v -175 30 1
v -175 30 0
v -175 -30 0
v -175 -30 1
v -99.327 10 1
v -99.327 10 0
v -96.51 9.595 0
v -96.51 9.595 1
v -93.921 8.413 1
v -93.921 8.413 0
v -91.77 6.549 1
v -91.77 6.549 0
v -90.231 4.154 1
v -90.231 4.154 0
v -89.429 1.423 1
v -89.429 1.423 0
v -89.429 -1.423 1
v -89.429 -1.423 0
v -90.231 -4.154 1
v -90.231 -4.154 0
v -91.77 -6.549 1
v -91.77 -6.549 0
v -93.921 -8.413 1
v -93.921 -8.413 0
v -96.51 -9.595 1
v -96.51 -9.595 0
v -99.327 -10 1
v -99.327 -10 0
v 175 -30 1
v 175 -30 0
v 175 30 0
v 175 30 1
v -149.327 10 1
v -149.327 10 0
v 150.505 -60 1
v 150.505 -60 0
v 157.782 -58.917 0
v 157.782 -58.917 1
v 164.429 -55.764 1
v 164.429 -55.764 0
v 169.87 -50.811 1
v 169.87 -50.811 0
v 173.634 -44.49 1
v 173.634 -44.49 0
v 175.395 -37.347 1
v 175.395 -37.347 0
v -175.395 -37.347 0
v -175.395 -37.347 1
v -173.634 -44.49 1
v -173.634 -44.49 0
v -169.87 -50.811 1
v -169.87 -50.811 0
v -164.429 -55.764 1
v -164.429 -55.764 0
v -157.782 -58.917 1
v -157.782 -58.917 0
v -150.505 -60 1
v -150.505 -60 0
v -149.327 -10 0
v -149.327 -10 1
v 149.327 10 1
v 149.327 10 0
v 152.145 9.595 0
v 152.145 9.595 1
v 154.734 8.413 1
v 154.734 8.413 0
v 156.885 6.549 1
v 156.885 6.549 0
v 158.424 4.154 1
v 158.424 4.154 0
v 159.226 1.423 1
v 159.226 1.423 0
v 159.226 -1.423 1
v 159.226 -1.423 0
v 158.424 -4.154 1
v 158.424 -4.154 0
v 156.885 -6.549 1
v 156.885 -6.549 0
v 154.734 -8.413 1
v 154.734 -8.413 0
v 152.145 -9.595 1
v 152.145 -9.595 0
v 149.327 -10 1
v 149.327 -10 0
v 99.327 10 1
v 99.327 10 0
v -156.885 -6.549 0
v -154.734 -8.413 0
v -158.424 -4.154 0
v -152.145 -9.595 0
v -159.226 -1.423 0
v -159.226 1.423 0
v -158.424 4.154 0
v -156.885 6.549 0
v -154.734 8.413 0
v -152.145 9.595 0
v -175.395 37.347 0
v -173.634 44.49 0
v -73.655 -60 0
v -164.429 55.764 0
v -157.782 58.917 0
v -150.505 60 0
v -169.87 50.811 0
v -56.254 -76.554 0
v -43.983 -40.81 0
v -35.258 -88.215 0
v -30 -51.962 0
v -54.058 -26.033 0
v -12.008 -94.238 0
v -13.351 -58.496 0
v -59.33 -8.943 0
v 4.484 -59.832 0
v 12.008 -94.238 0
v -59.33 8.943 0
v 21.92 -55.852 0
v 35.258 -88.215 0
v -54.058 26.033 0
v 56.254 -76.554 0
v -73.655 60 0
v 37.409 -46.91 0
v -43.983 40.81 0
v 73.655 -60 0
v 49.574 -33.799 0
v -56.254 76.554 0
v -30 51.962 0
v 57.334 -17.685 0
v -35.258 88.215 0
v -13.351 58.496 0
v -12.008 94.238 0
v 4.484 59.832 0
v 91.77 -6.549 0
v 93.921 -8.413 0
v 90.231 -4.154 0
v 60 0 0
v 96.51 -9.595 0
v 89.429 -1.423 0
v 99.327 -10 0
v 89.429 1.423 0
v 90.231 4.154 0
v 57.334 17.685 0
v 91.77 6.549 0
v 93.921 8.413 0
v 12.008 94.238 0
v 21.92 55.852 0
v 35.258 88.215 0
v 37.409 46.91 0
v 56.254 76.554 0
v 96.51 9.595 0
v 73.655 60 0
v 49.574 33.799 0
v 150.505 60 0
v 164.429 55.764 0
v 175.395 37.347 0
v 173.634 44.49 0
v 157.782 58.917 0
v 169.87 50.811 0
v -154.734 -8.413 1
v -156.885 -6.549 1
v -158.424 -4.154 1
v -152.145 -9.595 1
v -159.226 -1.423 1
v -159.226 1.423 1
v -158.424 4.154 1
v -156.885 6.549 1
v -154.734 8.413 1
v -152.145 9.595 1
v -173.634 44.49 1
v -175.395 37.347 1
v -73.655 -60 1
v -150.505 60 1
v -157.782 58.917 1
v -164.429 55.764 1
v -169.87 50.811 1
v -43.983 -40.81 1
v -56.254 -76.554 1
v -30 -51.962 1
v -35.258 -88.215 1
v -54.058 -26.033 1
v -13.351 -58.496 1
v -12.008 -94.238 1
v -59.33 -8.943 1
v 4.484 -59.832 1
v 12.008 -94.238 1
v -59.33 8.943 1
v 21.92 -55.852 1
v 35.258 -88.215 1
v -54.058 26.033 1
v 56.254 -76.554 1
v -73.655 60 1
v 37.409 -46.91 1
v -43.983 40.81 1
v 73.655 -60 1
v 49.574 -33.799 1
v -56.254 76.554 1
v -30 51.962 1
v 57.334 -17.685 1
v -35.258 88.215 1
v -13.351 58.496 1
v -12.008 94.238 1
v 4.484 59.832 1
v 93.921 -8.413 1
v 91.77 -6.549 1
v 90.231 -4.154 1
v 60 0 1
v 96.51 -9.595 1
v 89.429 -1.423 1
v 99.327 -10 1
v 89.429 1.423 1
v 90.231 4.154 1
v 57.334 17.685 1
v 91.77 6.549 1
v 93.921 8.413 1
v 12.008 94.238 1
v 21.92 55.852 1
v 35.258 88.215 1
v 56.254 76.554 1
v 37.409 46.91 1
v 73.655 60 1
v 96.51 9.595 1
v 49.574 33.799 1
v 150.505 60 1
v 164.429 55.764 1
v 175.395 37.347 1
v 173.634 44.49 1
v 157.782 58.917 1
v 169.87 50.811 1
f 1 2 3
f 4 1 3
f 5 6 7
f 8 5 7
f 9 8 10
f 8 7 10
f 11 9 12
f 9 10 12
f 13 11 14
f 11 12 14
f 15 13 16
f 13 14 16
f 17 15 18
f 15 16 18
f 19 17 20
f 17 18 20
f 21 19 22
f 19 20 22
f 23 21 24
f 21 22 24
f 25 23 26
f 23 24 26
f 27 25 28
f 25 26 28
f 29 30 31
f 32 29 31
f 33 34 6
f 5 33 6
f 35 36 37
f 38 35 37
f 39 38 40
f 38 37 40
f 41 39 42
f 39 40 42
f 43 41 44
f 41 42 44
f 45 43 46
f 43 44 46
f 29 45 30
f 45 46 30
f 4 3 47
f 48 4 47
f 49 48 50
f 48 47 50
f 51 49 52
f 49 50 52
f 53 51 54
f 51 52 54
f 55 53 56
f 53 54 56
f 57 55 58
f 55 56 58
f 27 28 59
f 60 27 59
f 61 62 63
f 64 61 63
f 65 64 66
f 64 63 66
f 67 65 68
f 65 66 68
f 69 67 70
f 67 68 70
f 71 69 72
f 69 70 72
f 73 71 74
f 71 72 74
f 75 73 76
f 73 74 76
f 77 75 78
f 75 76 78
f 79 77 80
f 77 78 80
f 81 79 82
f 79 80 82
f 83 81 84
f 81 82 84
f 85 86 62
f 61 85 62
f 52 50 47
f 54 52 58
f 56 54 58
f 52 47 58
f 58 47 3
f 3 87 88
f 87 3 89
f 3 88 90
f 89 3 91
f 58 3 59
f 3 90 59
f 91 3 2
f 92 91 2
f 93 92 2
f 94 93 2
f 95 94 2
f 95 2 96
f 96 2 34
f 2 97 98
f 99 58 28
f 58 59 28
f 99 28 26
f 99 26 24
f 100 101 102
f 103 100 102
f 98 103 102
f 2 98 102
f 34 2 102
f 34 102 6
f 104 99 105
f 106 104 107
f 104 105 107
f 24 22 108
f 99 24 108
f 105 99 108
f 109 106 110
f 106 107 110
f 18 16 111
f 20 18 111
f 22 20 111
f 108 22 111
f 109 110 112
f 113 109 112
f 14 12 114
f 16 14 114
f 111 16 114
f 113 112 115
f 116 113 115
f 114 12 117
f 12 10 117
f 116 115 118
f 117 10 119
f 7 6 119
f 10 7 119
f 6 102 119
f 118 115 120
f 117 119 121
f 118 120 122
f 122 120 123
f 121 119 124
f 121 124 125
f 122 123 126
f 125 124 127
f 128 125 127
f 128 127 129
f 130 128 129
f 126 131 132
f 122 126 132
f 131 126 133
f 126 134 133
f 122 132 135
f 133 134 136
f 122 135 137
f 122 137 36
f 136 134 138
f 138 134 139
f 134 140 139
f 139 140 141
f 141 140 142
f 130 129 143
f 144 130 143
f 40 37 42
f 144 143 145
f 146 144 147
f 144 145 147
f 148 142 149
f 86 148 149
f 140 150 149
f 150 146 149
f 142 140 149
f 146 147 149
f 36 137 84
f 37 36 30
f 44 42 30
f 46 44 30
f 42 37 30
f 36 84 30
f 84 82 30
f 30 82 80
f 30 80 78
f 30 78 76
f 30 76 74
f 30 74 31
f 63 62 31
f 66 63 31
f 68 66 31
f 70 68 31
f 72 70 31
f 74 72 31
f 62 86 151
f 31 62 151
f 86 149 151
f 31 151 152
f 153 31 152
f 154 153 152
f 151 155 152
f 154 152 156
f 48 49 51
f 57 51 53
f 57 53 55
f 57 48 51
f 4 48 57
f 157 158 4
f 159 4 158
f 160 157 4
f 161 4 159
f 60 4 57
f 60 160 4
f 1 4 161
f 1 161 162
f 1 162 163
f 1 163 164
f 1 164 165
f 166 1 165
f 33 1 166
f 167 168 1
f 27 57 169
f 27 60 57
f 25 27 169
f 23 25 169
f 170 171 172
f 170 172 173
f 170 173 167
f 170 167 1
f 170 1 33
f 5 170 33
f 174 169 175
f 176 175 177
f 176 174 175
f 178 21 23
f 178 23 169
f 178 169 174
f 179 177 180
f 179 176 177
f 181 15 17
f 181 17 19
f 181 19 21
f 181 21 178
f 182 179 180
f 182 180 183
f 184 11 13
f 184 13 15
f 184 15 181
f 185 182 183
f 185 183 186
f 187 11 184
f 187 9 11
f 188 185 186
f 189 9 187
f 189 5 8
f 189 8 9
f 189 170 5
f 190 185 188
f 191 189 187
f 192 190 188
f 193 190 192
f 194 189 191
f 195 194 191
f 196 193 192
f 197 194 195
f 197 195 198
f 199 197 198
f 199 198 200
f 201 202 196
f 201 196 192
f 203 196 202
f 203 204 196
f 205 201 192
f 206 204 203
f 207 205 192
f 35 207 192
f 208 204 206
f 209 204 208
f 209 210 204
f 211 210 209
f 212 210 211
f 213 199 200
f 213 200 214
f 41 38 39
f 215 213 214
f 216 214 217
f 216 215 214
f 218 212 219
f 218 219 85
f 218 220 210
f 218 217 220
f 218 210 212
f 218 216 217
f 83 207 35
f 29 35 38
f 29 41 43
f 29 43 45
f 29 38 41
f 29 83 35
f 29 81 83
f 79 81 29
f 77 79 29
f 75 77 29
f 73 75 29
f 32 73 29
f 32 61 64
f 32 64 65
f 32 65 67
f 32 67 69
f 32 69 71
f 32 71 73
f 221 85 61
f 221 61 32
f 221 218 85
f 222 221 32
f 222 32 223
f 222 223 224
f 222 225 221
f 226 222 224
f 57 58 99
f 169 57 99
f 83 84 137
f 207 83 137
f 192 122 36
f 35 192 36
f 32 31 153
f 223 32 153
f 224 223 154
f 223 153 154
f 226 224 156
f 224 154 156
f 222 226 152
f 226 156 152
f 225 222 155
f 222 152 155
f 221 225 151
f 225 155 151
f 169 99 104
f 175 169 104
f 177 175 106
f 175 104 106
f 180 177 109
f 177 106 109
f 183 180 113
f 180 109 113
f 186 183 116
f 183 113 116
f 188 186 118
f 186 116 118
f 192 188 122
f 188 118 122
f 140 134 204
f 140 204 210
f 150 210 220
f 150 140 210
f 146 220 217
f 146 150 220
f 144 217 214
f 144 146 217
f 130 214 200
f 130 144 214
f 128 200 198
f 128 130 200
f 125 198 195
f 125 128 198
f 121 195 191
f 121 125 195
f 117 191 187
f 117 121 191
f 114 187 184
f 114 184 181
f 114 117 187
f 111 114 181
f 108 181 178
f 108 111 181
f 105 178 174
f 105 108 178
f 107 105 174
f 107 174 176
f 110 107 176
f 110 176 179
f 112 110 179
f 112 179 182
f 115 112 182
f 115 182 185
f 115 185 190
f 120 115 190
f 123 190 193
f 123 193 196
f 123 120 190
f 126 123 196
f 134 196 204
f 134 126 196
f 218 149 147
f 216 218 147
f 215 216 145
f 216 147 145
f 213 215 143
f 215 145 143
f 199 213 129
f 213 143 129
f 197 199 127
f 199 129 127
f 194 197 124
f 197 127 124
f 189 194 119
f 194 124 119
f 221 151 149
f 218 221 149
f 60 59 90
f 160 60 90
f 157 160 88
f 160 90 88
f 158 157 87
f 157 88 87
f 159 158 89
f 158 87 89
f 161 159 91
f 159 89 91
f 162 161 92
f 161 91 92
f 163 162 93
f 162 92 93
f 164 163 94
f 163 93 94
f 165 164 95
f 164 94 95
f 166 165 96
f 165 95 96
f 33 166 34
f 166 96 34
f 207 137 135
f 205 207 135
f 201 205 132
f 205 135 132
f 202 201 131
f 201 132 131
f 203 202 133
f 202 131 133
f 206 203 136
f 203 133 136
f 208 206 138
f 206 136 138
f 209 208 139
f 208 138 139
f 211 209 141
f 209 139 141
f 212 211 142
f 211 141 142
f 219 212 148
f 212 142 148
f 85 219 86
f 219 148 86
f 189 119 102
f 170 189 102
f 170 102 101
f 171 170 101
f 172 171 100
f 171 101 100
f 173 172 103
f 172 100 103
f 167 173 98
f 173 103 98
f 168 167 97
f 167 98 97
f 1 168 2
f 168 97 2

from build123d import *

# Parameters (mm, degrees)
SKETCH1_R           = 60
BOSS_EXTRUDE1_DEPTH = 1


with BuildPart() as part:
    # Sketch1 → Boss-Extrude1 (new body)
    with BuildSketch(Plane.XY):
        with BuildLine():
            Line((-73.654599313, 60), (-150.505102572, 60))
            ThreePointArc((-150.505102572, 60), (-169.870019303, 50.811388301), (-175, 30))
            Line((-175, 30), (-175, -30))
            ThreePointArc((-175, -30), (-169.870019303, -50.811388301), (-150.505102572, -60))
            Line((-150.505102572, -60), (-73.654599313, -60))
            ThreePointArc((-73.654599313, -60), (0, -95), (73.654599313, -60))
            Line((73.654599313, -60), (150.505102572, -60))
            ThreePointArc((150.505102572, -60), (169.870019303, -50.811388301), (175, -30))
            Line((175, -30), (175, 30))
            ThreePointArc((175, 30), (169.870019303, 50.811388301), (150.505102572, 60))
            Line((150.505102572, 60), (73.654599313, 60))
            ThreePointArc((73.654599313, 60), (0, 95), (-73.654599313, 60))
        make_face()
        Circle(SKETCH1_R, mode=Mode.SUBTRACT)
        with BuildLine():
            Line((-149.327299657, 10), (-99.327299657, 10))
            ThreePointArc((-99.327299657, 10), (-89.327299657, 0), (-99.327299657, -10))
            Line((-99.327299657, -10), (-149.327299657, -10))
            ThreePointArc((-149.327299657, -10), (-159.327299657, 0), (-149.327299657, 10))
        make_face(mode=Mode.SUBTRACT)
        with BuildLine():
            Line((149.327299657, -10), (99.327299657, -10))
            ThreePointArc((99.327299657, -10), (89.327299657, 0), (99.327299657, 10))
            Line((99.327299657, 10), (149.327299657, 10))
            ThreePointArc((149.327299657, 10), (159.327299657, 0), (149.327299657, -10))
        make_face(mode=Mode.SUBTRACT)
    extrude(amount=BOSS_EXTRUDE1_DEPTH)


solid = part.part
